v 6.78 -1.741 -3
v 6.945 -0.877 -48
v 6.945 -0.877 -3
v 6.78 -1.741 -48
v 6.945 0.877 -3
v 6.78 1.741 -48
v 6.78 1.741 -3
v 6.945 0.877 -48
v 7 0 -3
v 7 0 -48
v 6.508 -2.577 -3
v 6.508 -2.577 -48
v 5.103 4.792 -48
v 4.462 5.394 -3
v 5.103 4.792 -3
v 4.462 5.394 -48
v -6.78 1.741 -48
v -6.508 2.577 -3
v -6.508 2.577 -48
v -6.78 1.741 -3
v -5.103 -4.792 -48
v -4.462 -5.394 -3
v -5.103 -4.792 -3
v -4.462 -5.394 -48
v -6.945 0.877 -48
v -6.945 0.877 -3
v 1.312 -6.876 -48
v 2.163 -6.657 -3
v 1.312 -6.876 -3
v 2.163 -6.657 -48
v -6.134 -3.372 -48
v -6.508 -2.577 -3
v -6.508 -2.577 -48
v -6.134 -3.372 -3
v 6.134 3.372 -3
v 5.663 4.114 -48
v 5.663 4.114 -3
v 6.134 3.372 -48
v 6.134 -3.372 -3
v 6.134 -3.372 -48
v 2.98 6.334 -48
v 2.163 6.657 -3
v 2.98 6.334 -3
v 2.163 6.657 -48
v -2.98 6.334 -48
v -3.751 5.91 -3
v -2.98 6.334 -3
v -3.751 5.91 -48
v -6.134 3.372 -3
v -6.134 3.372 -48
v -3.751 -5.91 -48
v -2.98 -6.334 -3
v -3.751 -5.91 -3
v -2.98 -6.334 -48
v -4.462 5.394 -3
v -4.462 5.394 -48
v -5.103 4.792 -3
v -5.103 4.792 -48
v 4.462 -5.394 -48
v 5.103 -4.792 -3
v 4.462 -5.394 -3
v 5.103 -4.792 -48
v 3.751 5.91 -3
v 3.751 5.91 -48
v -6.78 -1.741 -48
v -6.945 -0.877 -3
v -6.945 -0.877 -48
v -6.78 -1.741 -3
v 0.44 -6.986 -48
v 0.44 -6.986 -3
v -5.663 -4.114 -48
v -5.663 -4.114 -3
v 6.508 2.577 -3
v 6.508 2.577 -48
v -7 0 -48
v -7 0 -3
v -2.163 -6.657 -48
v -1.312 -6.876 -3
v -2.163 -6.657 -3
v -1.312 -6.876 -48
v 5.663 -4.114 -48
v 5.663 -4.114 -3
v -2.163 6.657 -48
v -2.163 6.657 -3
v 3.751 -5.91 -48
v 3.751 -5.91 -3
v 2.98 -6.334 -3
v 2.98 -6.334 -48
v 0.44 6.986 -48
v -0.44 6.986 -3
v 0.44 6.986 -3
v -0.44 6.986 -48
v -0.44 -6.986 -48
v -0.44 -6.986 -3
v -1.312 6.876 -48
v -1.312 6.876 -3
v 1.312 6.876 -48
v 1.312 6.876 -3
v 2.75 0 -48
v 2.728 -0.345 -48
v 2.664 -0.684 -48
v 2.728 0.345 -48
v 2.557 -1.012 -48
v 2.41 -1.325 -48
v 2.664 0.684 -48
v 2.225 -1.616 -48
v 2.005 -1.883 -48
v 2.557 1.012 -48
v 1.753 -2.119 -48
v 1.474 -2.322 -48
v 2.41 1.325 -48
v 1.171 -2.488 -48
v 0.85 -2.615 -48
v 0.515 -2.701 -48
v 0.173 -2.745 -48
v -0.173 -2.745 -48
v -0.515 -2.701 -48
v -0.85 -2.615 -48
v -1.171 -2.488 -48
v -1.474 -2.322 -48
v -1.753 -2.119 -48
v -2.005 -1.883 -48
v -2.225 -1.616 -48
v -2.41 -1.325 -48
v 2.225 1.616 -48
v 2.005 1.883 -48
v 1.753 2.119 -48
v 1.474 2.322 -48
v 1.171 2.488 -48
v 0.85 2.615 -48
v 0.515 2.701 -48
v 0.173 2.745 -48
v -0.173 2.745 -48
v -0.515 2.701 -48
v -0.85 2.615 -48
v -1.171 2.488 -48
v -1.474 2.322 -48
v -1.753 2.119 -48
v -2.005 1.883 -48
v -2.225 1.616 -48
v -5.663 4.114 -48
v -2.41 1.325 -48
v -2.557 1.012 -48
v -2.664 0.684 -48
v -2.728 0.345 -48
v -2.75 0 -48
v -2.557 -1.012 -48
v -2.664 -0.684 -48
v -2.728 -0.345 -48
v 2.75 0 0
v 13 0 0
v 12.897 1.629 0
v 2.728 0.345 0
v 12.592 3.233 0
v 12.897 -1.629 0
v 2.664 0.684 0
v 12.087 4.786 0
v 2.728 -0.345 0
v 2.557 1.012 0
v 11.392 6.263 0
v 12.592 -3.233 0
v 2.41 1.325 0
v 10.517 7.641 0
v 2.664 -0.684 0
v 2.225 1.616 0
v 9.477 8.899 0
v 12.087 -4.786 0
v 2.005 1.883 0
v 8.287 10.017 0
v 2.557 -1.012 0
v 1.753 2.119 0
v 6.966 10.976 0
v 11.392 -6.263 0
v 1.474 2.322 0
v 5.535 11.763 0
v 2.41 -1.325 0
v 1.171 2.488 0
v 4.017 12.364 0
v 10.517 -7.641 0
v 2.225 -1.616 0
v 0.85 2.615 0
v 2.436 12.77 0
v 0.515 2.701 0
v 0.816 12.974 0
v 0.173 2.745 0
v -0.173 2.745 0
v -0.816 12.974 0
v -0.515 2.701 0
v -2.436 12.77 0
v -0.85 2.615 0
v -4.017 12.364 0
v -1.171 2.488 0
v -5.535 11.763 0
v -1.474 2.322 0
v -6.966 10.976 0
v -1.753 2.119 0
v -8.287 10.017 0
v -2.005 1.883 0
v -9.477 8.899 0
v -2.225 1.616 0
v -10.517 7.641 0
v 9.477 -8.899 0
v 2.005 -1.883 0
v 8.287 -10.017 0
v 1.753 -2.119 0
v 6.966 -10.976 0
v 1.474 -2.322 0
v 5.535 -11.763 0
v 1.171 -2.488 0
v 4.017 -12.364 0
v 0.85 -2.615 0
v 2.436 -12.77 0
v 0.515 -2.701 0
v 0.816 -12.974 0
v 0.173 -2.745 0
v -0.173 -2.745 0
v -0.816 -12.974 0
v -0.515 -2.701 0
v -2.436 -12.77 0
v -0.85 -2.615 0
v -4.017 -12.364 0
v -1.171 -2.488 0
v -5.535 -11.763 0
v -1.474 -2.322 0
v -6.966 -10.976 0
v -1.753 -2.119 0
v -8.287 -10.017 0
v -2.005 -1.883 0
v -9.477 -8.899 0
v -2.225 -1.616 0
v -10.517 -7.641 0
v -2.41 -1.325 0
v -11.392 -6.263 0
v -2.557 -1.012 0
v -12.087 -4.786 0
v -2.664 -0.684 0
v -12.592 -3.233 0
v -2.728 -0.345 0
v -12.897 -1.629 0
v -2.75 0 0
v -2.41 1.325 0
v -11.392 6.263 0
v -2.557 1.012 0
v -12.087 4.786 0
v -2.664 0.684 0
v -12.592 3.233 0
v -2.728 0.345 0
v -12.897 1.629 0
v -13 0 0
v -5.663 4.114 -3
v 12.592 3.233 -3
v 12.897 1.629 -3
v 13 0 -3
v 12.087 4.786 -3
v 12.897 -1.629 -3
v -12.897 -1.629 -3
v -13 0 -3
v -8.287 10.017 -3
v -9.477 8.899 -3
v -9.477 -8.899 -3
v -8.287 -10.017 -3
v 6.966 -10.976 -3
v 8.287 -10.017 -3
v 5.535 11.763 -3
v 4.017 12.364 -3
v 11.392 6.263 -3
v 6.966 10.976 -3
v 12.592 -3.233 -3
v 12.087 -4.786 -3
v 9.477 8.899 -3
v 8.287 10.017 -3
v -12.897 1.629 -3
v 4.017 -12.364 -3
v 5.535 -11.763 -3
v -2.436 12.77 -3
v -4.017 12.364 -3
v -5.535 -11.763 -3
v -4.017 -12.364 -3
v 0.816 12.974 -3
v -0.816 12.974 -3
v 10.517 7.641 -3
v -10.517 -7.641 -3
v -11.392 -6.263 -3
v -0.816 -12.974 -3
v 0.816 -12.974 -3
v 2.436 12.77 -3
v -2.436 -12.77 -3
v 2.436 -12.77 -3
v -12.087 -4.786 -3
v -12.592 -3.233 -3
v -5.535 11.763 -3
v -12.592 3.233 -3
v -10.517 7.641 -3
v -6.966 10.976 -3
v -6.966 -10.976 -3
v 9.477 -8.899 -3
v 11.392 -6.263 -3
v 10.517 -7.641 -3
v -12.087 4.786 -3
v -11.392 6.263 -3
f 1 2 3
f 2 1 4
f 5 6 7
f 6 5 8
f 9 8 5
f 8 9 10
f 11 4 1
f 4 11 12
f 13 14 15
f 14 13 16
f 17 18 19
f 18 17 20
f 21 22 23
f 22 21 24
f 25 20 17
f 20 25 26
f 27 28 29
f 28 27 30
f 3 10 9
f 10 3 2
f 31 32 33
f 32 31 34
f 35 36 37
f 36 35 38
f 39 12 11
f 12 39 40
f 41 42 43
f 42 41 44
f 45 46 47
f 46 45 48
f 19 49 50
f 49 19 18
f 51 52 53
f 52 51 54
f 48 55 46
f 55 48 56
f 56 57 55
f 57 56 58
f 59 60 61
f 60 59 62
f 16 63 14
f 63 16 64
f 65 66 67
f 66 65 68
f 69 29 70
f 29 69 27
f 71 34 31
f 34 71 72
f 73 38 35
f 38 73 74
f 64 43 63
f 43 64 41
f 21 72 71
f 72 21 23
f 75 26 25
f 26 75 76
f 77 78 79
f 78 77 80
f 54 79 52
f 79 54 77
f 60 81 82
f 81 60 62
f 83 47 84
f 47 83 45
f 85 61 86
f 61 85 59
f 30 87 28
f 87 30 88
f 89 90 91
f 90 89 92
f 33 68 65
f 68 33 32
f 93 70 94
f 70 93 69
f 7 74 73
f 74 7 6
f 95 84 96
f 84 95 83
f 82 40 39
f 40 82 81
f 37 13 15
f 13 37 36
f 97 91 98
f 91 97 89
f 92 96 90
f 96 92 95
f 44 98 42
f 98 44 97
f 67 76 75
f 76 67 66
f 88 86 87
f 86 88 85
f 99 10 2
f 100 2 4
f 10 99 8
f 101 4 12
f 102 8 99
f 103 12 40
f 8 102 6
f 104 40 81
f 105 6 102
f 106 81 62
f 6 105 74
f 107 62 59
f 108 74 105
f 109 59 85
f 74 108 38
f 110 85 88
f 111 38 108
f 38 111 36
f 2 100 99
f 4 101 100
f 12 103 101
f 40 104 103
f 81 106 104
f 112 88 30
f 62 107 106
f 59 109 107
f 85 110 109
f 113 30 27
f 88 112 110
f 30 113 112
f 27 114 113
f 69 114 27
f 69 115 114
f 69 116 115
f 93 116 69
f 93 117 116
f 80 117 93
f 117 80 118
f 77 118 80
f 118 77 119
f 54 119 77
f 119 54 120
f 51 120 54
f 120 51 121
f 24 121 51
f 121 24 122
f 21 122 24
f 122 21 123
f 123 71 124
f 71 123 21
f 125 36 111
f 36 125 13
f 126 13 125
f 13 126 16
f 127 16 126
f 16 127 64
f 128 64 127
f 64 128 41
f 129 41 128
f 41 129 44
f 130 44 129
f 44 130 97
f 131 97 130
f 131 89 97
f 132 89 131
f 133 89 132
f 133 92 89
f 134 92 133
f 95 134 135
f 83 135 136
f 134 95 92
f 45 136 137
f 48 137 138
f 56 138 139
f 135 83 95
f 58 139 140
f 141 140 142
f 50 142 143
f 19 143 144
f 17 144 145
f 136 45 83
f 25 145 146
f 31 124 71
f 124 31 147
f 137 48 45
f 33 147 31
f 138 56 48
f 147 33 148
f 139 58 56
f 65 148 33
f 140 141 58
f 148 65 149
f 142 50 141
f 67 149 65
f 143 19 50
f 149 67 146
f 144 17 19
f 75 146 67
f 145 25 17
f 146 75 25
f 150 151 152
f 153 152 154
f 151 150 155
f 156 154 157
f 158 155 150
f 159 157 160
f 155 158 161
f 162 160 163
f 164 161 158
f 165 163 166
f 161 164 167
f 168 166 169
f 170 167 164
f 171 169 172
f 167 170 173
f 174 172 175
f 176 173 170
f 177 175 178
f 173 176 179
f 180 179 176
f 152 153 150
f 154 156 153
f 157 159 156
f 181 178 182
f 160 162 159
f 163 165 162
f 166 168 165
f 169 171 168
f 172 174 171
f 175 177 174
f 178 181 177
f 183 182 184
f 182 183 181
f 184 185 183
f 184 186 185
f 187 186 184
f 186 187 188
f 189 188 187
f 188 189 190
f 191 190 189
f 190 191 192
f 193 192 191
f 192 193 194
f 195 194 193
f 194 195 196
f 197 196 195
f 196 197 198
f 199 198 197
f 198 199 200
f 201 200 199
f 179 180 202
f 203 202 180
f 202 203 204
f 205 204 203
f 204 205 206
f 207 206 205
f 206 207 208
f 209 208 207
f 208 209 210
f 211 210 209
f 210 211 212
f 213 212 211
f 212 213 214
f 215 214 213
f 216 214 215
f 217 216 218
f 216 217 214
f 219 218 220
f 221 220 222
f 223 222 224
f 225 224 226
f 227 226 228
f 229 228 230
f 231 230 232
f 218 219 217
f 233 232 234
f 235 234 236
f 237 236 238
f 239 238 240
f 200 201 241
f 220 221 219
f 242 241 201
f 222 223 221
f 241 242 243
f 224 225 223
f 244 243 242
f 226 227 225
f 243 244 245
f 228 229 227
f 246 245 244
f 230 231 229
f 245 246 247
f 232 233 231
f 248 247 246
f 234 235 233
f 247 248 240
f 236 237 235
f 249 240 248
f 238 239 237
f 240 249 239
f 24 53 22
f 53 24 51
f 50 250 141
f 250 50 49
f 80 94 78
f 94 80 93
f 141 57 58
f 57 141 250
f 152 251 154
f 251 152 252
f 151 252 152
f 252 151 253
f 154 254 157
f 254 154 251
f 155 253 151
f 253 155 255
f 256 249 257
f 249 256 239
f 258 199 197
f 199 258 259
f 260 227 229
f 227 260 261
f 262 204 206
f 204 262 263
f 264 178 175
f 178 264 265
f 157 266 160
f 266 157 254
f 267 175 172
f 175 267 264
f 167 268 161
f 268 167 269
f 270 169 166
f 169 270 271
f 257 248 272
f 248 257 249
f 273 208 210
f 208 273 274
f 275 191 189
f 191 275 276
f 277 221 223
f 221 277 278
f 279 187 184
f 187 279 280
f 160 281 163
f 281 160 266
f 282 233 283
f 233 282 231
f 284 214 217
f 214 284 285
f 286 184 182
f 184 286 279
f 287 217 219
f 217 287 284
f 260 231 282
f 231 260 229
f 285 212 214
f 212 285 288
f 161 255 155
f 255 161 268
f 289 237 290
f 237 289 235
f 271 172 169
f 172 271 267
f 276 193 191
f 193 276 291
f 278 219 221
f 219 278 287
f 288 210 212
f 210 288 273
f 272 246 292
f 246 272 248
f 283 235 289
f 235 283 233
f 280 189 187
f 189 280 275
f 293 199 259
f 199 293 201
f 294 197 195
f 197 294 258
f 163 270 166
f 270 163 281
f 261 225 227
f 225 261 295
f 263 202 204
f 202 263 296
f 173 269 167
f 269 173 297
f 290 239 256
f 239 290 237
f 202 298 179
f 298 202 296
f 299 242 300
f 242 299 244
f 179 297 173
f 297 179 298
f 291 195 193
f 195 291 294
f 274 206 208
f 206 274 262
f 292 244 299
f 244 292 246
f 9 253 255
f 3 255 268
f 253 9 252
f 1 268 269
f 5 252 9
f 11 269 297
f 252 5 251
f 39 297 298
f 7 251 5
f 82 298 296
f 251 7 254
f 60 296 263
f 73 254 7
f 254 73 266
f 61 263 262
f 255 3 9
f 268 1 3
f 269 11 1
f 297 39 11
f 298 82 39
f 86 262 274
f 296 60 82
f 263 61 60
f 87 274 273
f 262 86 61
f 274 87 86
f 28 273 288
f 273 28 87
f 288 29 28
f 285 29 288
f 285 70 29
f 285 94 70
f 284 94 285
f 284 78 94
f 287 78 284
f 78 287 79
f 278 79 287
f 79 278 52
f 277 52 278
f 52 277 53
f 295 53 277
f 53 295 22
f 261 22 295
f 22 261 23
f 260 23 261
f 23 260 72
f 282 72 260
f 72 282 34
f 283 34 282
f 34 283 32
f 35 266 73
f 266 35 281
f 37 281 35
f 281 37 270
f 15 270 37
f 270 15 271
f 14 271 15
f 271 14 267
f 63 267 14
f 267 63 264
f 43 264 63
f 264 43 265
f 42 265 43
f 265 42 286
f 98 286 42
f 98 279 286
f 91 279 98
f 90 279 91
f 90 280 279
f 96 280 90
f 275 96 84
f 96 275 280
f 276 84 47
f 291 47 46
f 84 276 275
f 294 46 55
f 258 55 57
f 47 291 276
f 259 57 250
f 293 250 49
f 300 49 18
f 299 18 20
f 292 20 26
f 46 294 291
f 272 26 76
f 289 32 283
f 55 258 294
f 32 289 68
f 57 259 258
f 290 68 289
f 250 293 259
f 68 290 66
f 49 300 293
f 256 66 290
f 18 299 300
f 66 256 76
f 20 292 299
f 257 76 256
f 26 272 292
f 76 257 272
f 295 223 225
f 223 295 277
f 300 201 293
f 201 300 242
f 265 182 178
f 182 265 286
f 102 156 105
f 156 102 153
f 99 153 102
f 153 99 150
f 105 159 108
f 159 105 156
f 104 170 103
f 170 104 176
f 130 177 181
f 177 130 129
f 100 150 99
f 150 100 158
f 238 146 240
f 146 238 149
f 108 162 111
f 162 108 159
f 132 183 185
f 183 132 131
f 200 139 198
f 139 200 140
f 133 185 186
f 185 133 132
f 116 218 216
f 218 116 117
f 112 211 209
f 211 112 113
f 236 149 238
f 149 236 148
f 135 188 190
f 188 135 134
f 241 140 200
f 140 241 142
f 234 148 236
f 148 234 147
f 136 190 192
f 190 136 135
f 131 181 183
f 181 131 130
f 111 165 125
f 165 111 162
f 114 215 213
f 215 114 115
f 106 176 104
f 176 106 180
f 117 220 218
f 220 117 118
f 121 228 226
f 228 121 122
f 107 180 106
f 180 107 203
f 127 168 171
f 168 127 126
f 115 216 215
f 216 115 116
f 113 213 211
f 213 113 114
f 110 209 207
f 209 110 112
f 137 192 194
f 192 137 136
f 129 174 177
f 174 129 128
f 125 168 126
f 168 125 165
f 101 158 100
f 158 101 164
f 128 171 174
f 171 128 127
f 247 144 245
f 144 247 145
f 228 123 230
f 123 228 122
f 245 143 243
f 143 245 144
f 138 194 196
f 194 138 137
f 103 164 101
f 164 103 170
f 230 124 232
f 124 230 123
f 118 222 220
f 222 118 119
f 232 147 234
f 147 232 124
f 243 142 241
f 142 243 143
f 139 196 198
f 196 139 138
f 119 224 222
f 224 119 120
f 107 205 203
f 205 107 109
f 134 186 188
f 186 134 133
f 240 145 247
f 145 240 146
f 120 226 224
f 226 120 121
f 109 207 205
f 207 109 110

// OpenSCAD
$fn = 50;


difference() {
	union() {
		translate(v = [0, 0, -48.0000000000]) {
			cylinder(h = 48, r = 7.0000000000);
		}
		translate(v = [0, 0, -3.0000000000]) {
			cylinder(h = 3, r = 13.0000000000);
		}
	}
	union() {
		#translate(v = [0, 0, -48]) {
			cylinder(h = 48, r = 2.7500000000);
		}
	}
}
